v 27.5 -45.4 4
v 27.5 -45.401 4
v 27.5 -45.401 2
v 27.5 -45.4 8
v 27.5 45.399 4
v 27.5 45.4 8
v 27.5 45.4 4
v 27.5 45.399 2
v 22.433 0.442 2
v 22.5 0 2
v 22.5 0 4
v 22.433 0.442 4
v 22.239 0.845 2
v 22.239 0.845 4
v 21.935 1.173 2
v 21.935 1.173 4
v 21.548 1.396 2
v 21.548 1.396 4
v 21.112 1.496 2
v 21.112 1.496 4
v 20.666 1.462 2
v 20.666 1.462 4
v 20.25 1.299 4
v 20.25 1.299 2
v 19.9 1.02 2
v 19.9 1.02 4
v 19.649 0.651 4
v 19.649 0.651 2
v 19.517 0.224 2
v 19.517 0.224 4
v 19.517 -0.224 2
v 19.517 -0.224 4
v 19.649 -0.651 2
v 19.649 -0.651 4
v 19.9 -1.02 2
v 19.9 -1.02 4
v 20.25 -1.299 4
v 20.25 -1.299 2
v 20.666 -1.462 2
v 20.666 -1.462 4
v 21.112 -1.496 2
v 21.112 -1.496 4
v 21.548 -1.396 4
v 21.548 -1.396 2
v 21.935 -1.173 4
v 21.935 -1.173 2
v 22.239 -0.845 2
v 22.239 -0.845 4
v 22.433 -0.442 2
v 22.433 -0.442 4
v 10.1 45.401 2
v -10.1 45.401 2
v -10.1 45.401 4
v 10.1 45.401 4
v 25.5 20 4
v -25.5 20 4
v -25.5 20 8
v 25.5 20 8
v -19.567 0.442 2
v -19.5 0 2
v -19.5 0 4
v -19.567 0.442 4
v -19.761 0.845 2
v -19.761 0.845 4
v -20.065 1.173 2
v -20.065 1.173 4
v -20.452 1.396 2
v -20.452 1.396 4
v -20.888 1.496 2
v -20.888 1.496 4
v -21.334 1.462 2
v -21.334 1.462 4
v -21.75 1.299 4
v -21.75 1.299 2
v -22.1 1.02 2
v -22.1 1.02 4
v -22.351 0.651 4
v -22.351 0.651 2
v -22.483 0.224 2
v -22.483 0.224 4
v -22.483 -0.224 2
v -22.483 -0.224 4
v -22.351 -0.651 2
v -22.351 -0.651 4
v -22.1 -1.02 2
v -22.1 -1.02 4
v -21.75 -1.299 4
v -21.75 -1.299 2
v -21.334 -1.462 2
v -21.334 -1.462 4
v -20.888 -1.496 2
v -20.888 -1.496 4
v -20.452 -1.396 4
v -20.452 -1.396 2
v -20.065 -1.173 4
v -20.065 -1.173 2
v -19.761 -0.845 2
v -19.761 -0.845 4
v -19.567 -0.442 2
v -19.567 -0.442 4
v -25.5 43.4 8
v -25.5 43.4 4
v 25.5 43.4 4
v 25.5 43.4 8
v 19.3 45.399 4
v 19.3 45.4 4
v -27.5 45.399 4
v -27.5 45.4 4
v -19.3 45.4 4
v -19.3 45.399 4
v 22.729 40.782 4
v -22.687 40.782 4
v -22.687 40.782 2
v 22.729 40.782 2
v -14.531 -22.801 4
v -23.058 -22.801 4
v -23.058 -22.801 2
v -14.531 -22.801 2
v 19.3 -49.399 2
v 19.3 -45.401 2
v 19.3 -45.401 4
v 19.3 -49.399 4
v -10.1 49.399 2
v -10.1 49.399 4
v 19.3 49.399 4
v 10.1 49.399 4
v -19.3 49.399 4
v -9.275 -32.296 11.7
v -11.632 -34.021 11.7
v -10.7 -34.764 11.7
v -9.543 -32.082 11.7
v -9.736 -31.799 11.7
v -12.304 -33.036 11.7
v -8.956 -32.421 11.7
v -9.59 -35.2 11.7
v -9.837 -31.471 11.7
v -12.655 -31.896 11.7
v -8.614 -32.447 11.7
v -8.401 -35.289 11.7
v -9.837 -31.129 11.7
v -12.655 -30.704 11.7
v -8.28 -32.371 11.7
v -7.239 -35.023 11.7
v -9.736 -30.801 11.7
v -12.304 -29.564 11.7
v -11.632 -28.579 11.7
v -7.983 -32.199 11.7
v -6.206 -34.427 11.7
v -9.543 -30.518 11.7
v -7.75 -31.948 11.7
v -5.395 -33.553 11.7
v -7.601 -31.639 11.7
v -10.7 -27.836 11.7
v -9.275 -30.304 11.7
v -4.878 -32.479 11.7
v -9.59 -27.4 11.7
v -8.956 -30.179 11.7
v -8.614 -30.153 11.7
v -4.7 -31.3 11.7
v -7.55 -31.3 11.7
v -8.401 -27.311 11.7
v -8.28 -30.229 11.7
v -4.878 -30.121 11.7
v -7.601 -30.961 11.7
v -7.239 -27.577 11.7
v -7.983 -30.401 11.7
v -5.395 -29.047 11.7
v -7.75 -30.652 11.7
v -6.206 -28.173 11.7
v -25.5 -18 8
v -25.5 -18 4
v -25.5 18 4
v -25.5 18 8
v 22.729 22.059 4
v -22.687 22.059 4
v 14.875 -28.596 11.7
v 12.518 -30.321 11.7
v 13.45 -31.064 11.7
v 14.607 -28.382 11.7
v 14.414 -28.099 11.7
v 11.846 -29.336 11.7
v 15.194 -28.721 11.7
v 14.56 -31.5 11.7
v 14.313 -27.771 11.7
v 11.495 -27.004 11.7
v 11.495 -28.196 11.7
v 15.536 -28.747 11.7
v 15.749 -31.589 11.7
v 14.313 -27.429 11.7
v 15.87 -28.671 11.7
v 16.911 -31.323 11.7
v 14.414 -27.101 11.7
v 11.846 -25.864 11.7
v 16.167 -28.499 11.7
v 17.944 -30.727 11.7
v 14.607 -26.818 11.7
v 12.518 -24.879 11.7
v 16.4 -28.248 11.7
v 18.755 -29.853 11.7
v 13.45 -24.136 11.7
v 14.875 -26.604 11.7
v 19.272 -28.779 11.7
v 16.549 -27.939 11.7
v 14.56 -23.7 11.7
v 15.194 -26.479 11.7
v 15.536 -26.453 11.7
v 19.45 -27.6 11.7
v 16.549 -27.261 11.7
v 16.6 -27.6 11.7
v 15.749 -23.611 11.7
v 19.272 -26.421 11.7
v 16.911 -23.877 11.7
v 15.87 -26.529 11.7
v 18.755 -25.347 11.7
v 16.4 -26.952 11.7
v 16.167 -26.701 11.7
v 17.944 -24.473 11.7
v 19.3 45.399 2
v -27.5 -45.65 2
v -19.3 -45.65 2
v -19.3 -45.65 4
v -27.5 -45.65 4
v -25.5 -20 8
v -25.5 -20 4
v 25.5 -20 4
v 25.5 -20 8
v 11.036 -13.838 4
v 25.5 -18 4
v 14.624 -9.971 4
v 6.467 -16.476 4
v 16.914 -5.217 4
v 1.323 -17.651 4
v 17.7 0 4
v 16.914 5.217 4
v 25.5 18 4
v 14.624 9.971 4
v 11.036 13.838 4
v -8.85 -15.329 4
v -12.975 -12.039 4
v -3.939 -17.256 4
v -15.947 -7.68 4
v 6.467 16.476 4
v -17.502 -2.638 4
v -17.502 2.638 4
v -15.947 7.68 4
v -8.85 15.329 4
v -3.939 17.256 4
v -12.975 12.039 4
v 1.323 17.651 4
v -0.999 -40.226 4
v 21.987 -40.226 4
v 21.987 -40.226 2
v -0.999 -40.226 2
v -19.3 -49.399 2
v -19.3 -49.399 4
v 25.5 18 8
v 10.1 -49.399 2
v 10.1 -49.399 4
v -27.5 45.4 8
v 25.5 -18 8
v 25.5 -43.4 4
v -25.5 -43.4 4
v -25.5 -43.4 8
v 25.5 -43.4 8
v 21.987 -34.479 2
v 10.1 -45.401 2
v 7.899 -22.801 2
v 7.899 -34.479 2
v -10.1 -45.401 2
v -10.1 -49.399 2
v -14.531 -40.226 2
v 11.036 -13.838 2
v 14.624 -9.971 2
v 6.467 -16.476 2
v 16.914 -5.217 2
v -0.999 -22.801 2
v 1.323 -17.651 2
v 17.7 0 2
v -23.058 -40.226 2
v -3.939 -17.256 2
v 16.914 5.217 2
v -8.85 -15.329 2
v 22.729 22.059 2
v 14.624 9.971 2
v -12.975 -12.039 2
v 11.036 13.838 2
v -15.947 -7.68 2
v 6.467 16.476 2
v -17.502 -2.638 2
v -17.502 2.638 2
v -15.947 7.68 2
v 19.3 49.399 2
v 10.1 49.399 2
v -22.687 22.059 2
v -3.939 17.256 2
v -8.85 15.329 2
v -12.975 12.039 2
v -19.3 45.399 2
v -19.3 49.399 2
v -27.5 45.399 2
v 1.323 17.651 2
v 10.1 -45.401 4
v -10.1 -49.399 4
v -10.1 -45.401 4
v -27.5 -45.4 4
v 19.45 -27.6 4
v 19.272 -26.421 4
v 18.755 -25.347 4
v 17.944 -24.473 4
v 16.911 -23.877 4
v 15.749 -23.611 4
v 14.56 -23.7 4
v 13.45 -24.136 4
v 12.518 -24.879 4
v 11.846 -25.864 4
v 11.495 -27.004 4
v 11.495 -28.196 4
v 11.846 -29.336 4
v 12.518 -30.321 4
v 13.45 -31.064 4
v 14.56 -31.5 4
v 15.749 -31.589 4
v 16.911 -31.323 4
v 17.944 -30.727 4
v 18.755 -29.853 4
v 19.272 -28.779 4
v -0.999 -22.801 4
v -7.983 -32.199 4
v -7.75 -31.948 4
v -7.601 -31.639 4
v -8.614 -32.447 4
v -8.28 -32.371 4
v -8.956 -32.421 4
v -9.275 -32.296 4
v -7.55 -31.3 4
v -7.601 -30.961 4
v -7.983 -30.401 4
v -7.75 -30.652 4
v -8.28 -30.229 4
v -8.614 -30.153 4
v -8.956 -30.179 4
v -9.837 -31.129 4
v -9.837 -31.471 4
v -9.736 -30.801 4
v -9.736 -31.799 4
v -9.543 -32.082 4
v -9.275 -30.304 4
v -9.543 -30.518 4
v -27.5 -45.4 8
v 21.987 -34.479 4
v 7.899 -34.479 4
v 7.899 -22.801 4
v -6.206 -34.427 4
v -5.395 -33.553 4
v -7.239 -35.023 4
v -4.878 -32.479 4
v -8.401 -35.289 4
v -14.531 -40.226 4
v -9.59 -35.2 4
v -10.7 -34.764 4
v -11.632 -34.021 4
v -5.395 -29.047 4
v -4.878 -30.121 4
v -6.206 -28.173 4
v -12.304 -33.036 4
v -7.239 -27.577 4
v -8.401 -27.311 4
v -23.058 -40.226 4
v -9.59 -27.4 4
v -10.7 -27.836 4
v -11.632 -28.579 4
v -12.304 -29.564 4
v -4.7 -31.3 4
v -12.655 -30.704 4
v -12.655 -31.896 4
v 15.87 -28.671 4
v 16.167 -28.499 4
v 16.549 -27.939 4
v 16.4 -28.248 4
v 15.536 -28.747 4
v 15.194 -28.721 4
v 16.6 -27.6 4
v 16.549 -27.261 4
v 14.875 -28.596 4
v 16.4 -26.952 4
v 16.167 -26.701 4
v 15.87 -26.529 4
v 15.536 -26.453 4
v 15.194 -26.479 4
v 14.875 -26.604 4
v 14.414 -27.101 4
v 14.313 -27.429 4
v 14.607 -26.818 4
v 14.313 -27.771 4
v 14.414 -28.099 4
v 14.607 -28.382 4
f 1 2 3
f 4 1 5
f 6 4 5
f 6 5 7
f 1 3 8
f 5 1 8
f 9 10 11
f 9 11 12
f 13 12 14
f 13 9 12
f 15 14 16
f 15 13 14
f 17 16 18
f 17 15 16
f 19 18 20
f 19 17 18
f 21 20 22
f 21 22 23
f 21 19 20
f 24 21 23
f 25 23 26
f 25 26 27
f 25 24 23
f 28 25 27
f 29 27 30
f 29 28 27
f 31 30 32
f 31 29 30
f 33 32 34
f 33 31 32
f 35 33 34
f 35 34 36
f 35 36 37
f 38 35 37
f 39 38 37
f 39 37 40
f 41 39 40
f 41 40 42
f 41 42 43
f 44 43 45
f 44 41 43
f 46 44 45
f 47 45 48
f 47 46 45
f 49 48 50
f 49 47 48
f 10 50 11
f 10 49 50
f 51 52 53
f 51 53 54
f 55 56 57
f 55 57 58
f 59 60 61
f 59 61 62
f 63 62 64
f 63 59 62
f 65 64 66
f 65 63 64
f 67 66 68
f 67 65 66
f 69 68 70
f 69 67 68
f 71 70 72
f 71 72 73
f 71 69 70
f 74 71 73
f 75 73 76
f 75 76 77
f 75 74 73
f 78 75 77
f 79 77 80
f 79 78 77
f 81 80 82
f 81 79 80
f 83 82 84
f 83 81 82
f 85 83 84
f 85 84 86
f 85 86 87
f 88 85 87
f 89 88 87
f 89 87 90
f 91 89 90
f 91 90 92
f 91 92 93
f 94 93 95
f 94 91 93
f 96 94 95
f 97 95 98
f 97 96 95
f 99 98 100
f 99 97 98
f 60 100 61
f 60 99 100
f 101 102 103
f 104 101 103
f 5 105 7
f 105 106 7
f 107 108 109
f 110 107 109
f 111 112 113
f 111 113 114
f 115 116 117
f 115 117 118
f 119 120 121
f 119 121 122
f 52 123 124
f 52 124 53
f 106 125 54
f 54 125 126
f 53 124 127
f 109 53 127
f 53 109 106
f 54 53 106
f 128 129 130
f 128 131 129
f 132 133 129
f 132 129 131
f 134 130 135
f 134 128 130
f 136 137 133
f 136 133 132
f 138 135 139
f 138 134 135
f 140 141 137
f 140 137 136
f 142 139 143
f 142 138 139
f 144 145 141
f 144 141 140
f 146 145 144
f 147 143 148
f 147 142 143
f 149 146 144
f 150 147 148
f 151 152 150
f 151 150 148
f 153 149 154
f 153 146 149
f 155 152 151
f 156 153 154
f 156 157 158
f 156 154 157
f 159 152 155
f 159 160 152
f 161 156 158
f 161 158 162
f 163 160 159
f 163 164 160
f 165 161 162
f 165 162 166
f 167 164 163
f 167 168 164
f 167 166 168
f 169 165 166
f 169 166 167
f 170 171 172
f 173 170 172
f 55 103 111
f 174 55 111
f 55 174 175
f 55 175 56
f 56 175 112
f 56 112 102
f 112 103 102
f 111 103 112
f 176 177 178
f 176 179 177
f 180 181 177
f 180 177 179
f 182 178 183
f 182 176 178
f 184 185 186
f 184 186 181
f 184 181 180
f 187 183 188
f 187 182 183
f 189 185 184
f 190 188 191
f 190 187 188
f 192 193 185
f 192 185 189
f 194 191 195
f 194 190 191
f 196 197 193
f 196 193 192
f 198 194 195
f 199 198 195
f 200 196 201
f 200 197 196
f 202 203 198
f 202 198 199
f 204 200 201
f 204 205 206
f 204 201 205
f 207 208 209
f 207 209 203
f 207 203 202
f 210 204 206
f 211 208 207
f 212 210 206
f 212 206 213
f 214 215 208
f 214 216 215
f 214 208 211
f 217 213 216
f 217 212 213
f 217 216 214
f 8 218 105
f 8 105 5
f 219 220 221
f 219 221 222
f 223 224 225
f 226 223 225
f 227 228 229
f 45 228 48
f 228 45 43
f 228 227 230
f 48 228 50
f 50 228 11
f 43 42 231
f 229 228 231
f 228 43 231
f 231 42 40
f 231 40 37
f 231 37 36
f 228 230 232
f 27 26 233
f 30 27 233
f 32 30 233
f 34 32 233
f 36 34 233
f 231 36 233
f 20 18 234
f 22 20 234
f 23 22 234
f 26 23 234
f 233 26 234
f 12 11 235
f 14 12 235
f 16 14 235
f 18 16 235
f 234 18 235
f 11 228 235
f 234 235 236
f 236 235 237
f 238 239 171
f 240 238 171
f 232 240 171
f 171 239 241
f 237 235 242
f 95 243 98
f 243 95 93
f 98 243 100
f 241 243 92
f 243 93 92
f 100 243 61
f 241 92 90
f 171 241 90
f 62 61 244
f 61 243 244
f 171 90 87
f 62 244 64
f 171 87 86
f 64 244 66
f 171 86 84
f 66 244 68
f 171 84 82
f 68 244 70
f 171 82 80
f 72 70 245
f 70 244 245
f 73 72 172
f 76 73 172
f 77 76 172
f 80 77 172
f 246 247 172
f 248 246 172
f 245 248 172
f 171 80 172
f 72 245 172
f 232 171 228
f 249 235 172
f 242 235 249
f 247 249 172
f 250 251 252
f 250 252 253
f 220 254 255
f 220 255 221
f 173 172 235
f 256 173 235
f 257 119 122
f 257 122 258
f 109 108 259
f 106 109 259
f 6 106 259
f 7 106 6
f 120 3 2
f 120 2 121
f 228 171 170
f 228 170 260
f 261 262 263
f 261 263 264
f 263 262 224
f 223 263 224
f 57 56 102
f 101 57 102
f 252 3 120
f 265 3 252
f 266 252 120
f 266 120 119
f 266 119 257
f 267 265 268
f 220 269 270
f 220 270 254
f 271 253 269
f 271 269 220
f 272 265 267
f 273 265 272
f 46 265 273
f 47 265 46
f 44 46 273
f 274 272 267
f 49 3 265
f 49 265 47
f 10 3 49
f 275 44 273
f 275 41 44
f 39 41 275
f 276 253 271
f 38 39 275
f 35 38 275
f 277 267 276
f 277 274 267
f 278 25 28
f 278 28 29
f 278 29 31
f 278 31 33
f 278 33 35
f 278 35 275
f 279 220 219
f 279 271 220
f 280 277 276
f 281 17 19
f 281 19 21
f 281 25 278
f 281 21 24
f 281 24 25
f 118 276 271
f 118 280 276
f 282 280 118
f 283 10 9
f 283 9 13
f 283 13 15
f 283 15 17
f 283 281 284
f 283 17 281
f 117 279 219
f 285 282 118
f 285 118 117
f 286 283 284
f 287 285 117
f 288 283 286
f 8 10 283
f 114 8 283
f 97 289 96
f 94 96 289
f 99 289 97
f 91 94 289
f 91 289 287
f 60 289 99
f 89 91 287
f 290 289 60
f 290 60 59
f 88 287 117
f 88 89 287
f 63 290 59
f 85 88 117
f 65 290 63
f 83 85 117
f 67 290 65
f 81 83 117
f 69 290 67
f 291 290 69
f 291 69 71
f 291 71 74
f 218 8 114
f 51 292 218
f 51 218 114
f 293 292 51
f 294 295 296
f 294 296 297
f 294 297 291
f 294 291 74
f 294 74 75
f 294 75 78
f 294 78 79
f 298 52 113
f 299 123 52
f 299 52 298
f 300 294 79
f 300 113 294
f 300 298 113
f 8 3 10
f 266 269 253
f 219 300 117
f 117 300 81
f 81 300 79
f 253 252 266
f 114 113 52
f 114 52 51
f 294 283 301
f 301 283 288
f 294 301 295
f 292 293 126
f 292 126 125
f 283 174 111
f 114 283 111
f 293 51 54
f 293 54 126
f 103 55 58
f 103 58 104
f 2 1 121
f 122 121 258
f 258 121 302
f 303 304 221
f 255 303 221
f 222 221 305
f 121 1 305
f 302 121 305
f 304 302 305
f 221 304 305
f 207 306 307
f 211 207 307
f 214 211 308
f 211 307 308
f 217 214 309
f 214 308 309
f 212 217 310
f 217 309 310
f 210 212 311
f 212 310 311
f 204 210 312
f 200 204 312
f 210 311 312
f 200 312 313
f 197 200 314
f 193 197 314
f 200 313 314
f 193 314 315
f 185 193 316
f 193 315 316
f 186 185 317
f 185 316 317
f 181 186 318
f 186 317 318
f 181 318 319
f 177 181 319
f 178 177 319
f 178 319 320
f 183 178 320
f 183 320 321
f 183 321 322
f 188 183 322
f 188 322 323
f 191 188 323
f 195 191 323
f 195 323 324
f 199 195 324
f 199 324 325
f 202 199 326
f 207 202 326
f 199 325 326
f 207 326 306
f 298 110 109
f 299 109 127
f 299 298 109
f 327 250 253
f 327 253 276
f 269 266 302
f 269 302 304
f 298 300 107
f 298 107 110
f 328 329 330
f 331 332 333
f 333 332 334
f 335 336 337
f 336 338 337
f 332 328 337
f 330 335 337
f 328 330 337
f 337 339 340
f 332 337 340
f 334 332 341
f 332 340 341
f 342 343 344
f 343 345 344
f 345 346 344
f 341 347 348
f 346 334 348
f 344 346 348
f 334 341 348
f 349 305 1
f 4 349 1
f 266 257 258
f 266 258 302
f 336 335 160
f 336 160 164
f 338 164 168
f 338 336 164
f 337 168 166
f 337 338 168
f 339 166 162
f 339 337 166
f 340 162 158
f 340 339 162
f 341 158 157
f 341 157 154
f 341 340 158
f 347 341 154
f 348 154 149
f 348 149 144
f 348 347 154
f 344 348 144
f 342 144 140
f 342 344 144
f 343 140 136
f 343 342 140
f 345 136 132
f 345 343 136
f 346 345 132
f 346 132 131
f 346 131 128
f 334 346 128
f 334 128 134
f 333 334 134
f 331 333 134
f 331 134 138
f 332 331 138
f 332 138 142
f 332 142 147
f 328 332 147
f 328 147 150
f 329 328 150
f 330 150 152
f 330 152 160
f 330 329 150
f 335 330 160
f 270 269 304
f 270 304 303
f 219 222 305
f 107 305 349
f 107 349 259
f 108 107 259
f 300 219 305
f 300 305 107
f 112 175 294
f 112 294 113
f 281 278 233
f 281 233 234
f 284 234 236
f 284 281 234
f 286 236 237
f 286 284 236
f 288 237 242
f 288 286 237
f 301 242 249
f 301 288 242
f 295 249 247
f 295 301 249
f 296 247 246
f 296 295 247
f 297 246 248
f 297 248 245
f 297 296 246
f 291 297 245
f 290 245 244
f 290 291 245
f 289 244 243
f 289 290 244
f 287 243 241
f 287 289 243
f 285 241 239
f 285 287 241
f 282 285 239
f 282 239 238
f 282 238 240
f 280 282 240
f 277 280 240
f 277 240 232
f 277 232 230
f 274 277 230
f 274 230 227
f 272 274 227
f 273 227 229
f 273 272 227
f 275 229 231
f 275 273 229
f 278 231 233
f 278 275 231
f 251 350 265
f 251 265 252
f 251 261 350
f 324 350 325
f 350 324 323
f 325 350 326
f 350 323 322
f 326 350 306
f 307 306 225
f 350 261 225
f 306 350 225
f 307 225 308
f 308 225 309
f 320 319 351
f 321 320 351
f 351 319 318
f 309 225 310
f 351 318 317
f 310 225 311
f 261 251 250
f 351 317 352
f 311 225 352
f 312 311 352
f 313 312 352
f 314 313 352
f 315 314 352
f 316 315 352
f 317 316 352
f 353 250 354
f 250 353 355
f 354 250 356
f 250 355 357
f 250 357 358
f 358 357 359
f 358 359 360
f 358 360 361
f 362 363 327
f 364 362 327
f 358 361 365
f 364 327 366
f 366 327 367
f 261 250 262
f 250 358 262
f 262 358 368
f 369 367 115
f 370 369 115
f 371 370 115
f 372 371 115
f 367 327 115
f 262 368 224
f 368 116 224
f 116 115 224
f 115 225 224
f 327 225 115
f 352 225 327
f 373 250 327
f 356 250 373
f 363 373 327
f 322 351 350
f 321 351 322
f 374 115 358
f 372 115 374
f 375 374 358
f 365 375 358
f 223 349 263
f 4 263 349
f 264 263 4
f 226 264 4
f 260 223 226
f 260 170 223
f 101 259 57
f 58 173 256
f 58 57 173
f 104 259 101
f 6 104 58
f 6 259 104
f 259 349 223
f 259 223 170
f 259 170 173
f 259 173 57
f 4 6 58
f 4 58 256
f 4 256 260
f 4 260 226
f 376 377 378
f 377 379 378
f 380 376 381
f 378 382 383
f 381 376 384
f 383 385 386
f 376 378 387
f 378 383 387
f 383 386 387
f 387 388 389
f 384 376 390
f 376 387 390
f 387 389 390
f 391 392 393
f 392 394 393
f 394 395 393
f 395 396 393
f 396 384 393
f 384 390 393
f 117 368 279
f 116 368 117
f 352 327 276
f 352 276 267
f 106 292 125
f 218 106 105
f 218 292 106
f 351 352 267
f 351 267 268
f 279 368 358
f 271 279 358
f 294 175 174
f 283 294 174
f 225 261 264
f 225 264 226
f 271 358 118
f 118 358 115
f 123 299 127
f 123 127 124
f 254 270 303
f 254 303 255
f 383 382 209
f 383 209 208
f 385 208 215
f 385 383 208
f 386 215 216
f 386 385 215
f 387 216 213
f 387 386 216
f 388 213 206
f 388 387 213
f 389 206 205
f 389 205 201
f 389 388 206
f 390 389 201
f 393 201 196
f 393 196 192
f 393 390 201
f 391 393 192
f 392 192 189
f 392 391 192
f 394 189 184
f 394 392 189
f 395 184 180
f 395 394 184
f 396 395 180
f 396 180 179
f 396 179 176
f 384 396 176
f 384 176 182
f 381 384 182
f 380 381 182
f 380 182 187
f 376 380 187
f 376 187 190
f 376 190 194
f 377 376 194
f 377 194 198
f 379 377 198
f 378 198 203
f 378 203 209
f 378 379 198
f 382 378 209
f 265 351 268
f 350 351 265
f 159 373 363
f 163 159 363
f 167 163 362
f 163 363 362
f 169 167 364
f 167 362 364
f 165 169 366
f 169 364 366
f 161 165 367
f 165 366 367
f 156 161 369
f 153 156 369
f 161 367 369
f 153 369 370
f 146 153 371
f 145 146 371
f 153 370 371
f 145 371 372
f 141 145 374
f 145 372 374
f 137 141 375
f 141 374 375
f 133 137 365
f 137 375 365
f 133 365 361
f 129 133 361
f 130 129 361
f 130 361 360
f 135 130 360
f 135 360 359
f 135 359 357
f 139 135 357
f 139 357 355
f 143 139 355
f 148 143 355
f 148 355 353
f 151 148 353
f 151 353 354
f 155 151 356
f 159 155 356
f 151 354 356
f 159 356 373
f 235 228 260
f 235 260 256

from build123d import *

# Parameters (mm, degrees)
SKETCH_R      = 17.7
SKETCH_R_2    = 1.5
PAD_DEPTH     = 2
SKETCH001_R   = 4
SKETCH001_R_2 = 1.15
PAD001_DEPTH  = 7.7
SKETCH002_W   = 55
SKETCH002_H   = 90.8
SKETCH002_W_2 = 51
SKETCH002_H_2 = 36
SKETCH002_H_3 = 23.4
PAD002_DEPTH  = 4
SKETCH003_W   = 45.416033
SKETCH003_H   = 18.722532
SKETCH003_W_2 = 8.527091
SKETCH003_H_2 = 17.424923
POCKET_DEPTH  = 2.001


with BuildPart() as part:
    # Sketch → Pad (new body)
    with BuildSketch(Plane.XY.offset(2)):
        Polygon((-19.3, 49.399), (-10.1, 49.399), (-10.1, 45.401), (10.1, 45.401), (10.1, 49.399), (19.3, 49.399), (19.3, 45.399), (27.5, 45.399), (27.5, -45.401), (19.3, -45.401), (19.3, -49.399), (10.1, -49.399), (10.1, -45.401), (-10.1, -45.401), (-10.1, -49.399), (-19.3, -49.399), (-19.3, -45.649884), (-27.5, -45.649884), (-27.5, 45.399), (-19.3, 45.399), align=None)
        Circle(SKETCH_R, mode=Mode.SUBTRACT)
        with Locations((-21, 0)):
            Circle(SKETCH_R_2, mode=Mode.SUBTRACT)
        with Locations((21, 0)):
            Circle(SKETCH_R_2, mode=Mode.SUBTRACT)
    extrude(amount=PAD_DEPTH)

    # Sketch001 → Pad001 (new body)
    with BuildSketch(Plane.XY.offset(4)):
        with Locations((15.45, -27.6)):
            Circle(SKETCH001_R)
        with Locations((15.45, -27.6)):
            Circle(SKETCH001_R_2, mode=Mode.SUBTRACT)
        with Locations((-8.7, -31.3)):
            Circle(SKETCH001_R)
        with Locations((-8.7, -31.3)):
            Circle(SKETCH001_R_2, mode=Mode.SUBTRACT)
    extrude(amount=PAD001_DEPTH)

    # Sketch002 → Pad002 (new body)
    with BuildSketch(Plane.XY.offset(4)):
        Rectangle(SKETCH002_W, SKETCH002_H)
        Rectangle(SKETCH002_W_2, SKETCH002_H_2, mode=Mode.SUBTRACT)
        with Locations((0, 31.7)):
            Rectangle(SKETCH002_W_2, SKETCH002_H_3, mode=Mode.SUBTRACT)
        with Locations((0, -31.7)):
            Rectangle(SKETCH002_W_2, SKETCH002_H_3, mode=Mode.SUBTRACT)
    extrude(amount=PAD002_DEPTH)

    # Sketch003 → Pocket (cut, through all)
    with BuildSketch(Plane.XY.offset(4)):
        with Locations((0.020594, 31.420495)):
            Rectangle(SKETCH003_W, SKETCH003_H)
        with Locations((-18.794618, -31.513151)):
            Rectangle(SKETCH003_W_2, SKETCH003_H_2)
        Polygon((-0.998942, -22.80069), (7.898897, -22.80069), (7.898897, -34.479092), (21.987135, -34.479092), (21.987135, -40.225613), (-0.998942, -40.225613), align=None)
    extrude(amount=-POCKET_DEPTH, mode=Mode.SUBTRACT)


solid = part.part
